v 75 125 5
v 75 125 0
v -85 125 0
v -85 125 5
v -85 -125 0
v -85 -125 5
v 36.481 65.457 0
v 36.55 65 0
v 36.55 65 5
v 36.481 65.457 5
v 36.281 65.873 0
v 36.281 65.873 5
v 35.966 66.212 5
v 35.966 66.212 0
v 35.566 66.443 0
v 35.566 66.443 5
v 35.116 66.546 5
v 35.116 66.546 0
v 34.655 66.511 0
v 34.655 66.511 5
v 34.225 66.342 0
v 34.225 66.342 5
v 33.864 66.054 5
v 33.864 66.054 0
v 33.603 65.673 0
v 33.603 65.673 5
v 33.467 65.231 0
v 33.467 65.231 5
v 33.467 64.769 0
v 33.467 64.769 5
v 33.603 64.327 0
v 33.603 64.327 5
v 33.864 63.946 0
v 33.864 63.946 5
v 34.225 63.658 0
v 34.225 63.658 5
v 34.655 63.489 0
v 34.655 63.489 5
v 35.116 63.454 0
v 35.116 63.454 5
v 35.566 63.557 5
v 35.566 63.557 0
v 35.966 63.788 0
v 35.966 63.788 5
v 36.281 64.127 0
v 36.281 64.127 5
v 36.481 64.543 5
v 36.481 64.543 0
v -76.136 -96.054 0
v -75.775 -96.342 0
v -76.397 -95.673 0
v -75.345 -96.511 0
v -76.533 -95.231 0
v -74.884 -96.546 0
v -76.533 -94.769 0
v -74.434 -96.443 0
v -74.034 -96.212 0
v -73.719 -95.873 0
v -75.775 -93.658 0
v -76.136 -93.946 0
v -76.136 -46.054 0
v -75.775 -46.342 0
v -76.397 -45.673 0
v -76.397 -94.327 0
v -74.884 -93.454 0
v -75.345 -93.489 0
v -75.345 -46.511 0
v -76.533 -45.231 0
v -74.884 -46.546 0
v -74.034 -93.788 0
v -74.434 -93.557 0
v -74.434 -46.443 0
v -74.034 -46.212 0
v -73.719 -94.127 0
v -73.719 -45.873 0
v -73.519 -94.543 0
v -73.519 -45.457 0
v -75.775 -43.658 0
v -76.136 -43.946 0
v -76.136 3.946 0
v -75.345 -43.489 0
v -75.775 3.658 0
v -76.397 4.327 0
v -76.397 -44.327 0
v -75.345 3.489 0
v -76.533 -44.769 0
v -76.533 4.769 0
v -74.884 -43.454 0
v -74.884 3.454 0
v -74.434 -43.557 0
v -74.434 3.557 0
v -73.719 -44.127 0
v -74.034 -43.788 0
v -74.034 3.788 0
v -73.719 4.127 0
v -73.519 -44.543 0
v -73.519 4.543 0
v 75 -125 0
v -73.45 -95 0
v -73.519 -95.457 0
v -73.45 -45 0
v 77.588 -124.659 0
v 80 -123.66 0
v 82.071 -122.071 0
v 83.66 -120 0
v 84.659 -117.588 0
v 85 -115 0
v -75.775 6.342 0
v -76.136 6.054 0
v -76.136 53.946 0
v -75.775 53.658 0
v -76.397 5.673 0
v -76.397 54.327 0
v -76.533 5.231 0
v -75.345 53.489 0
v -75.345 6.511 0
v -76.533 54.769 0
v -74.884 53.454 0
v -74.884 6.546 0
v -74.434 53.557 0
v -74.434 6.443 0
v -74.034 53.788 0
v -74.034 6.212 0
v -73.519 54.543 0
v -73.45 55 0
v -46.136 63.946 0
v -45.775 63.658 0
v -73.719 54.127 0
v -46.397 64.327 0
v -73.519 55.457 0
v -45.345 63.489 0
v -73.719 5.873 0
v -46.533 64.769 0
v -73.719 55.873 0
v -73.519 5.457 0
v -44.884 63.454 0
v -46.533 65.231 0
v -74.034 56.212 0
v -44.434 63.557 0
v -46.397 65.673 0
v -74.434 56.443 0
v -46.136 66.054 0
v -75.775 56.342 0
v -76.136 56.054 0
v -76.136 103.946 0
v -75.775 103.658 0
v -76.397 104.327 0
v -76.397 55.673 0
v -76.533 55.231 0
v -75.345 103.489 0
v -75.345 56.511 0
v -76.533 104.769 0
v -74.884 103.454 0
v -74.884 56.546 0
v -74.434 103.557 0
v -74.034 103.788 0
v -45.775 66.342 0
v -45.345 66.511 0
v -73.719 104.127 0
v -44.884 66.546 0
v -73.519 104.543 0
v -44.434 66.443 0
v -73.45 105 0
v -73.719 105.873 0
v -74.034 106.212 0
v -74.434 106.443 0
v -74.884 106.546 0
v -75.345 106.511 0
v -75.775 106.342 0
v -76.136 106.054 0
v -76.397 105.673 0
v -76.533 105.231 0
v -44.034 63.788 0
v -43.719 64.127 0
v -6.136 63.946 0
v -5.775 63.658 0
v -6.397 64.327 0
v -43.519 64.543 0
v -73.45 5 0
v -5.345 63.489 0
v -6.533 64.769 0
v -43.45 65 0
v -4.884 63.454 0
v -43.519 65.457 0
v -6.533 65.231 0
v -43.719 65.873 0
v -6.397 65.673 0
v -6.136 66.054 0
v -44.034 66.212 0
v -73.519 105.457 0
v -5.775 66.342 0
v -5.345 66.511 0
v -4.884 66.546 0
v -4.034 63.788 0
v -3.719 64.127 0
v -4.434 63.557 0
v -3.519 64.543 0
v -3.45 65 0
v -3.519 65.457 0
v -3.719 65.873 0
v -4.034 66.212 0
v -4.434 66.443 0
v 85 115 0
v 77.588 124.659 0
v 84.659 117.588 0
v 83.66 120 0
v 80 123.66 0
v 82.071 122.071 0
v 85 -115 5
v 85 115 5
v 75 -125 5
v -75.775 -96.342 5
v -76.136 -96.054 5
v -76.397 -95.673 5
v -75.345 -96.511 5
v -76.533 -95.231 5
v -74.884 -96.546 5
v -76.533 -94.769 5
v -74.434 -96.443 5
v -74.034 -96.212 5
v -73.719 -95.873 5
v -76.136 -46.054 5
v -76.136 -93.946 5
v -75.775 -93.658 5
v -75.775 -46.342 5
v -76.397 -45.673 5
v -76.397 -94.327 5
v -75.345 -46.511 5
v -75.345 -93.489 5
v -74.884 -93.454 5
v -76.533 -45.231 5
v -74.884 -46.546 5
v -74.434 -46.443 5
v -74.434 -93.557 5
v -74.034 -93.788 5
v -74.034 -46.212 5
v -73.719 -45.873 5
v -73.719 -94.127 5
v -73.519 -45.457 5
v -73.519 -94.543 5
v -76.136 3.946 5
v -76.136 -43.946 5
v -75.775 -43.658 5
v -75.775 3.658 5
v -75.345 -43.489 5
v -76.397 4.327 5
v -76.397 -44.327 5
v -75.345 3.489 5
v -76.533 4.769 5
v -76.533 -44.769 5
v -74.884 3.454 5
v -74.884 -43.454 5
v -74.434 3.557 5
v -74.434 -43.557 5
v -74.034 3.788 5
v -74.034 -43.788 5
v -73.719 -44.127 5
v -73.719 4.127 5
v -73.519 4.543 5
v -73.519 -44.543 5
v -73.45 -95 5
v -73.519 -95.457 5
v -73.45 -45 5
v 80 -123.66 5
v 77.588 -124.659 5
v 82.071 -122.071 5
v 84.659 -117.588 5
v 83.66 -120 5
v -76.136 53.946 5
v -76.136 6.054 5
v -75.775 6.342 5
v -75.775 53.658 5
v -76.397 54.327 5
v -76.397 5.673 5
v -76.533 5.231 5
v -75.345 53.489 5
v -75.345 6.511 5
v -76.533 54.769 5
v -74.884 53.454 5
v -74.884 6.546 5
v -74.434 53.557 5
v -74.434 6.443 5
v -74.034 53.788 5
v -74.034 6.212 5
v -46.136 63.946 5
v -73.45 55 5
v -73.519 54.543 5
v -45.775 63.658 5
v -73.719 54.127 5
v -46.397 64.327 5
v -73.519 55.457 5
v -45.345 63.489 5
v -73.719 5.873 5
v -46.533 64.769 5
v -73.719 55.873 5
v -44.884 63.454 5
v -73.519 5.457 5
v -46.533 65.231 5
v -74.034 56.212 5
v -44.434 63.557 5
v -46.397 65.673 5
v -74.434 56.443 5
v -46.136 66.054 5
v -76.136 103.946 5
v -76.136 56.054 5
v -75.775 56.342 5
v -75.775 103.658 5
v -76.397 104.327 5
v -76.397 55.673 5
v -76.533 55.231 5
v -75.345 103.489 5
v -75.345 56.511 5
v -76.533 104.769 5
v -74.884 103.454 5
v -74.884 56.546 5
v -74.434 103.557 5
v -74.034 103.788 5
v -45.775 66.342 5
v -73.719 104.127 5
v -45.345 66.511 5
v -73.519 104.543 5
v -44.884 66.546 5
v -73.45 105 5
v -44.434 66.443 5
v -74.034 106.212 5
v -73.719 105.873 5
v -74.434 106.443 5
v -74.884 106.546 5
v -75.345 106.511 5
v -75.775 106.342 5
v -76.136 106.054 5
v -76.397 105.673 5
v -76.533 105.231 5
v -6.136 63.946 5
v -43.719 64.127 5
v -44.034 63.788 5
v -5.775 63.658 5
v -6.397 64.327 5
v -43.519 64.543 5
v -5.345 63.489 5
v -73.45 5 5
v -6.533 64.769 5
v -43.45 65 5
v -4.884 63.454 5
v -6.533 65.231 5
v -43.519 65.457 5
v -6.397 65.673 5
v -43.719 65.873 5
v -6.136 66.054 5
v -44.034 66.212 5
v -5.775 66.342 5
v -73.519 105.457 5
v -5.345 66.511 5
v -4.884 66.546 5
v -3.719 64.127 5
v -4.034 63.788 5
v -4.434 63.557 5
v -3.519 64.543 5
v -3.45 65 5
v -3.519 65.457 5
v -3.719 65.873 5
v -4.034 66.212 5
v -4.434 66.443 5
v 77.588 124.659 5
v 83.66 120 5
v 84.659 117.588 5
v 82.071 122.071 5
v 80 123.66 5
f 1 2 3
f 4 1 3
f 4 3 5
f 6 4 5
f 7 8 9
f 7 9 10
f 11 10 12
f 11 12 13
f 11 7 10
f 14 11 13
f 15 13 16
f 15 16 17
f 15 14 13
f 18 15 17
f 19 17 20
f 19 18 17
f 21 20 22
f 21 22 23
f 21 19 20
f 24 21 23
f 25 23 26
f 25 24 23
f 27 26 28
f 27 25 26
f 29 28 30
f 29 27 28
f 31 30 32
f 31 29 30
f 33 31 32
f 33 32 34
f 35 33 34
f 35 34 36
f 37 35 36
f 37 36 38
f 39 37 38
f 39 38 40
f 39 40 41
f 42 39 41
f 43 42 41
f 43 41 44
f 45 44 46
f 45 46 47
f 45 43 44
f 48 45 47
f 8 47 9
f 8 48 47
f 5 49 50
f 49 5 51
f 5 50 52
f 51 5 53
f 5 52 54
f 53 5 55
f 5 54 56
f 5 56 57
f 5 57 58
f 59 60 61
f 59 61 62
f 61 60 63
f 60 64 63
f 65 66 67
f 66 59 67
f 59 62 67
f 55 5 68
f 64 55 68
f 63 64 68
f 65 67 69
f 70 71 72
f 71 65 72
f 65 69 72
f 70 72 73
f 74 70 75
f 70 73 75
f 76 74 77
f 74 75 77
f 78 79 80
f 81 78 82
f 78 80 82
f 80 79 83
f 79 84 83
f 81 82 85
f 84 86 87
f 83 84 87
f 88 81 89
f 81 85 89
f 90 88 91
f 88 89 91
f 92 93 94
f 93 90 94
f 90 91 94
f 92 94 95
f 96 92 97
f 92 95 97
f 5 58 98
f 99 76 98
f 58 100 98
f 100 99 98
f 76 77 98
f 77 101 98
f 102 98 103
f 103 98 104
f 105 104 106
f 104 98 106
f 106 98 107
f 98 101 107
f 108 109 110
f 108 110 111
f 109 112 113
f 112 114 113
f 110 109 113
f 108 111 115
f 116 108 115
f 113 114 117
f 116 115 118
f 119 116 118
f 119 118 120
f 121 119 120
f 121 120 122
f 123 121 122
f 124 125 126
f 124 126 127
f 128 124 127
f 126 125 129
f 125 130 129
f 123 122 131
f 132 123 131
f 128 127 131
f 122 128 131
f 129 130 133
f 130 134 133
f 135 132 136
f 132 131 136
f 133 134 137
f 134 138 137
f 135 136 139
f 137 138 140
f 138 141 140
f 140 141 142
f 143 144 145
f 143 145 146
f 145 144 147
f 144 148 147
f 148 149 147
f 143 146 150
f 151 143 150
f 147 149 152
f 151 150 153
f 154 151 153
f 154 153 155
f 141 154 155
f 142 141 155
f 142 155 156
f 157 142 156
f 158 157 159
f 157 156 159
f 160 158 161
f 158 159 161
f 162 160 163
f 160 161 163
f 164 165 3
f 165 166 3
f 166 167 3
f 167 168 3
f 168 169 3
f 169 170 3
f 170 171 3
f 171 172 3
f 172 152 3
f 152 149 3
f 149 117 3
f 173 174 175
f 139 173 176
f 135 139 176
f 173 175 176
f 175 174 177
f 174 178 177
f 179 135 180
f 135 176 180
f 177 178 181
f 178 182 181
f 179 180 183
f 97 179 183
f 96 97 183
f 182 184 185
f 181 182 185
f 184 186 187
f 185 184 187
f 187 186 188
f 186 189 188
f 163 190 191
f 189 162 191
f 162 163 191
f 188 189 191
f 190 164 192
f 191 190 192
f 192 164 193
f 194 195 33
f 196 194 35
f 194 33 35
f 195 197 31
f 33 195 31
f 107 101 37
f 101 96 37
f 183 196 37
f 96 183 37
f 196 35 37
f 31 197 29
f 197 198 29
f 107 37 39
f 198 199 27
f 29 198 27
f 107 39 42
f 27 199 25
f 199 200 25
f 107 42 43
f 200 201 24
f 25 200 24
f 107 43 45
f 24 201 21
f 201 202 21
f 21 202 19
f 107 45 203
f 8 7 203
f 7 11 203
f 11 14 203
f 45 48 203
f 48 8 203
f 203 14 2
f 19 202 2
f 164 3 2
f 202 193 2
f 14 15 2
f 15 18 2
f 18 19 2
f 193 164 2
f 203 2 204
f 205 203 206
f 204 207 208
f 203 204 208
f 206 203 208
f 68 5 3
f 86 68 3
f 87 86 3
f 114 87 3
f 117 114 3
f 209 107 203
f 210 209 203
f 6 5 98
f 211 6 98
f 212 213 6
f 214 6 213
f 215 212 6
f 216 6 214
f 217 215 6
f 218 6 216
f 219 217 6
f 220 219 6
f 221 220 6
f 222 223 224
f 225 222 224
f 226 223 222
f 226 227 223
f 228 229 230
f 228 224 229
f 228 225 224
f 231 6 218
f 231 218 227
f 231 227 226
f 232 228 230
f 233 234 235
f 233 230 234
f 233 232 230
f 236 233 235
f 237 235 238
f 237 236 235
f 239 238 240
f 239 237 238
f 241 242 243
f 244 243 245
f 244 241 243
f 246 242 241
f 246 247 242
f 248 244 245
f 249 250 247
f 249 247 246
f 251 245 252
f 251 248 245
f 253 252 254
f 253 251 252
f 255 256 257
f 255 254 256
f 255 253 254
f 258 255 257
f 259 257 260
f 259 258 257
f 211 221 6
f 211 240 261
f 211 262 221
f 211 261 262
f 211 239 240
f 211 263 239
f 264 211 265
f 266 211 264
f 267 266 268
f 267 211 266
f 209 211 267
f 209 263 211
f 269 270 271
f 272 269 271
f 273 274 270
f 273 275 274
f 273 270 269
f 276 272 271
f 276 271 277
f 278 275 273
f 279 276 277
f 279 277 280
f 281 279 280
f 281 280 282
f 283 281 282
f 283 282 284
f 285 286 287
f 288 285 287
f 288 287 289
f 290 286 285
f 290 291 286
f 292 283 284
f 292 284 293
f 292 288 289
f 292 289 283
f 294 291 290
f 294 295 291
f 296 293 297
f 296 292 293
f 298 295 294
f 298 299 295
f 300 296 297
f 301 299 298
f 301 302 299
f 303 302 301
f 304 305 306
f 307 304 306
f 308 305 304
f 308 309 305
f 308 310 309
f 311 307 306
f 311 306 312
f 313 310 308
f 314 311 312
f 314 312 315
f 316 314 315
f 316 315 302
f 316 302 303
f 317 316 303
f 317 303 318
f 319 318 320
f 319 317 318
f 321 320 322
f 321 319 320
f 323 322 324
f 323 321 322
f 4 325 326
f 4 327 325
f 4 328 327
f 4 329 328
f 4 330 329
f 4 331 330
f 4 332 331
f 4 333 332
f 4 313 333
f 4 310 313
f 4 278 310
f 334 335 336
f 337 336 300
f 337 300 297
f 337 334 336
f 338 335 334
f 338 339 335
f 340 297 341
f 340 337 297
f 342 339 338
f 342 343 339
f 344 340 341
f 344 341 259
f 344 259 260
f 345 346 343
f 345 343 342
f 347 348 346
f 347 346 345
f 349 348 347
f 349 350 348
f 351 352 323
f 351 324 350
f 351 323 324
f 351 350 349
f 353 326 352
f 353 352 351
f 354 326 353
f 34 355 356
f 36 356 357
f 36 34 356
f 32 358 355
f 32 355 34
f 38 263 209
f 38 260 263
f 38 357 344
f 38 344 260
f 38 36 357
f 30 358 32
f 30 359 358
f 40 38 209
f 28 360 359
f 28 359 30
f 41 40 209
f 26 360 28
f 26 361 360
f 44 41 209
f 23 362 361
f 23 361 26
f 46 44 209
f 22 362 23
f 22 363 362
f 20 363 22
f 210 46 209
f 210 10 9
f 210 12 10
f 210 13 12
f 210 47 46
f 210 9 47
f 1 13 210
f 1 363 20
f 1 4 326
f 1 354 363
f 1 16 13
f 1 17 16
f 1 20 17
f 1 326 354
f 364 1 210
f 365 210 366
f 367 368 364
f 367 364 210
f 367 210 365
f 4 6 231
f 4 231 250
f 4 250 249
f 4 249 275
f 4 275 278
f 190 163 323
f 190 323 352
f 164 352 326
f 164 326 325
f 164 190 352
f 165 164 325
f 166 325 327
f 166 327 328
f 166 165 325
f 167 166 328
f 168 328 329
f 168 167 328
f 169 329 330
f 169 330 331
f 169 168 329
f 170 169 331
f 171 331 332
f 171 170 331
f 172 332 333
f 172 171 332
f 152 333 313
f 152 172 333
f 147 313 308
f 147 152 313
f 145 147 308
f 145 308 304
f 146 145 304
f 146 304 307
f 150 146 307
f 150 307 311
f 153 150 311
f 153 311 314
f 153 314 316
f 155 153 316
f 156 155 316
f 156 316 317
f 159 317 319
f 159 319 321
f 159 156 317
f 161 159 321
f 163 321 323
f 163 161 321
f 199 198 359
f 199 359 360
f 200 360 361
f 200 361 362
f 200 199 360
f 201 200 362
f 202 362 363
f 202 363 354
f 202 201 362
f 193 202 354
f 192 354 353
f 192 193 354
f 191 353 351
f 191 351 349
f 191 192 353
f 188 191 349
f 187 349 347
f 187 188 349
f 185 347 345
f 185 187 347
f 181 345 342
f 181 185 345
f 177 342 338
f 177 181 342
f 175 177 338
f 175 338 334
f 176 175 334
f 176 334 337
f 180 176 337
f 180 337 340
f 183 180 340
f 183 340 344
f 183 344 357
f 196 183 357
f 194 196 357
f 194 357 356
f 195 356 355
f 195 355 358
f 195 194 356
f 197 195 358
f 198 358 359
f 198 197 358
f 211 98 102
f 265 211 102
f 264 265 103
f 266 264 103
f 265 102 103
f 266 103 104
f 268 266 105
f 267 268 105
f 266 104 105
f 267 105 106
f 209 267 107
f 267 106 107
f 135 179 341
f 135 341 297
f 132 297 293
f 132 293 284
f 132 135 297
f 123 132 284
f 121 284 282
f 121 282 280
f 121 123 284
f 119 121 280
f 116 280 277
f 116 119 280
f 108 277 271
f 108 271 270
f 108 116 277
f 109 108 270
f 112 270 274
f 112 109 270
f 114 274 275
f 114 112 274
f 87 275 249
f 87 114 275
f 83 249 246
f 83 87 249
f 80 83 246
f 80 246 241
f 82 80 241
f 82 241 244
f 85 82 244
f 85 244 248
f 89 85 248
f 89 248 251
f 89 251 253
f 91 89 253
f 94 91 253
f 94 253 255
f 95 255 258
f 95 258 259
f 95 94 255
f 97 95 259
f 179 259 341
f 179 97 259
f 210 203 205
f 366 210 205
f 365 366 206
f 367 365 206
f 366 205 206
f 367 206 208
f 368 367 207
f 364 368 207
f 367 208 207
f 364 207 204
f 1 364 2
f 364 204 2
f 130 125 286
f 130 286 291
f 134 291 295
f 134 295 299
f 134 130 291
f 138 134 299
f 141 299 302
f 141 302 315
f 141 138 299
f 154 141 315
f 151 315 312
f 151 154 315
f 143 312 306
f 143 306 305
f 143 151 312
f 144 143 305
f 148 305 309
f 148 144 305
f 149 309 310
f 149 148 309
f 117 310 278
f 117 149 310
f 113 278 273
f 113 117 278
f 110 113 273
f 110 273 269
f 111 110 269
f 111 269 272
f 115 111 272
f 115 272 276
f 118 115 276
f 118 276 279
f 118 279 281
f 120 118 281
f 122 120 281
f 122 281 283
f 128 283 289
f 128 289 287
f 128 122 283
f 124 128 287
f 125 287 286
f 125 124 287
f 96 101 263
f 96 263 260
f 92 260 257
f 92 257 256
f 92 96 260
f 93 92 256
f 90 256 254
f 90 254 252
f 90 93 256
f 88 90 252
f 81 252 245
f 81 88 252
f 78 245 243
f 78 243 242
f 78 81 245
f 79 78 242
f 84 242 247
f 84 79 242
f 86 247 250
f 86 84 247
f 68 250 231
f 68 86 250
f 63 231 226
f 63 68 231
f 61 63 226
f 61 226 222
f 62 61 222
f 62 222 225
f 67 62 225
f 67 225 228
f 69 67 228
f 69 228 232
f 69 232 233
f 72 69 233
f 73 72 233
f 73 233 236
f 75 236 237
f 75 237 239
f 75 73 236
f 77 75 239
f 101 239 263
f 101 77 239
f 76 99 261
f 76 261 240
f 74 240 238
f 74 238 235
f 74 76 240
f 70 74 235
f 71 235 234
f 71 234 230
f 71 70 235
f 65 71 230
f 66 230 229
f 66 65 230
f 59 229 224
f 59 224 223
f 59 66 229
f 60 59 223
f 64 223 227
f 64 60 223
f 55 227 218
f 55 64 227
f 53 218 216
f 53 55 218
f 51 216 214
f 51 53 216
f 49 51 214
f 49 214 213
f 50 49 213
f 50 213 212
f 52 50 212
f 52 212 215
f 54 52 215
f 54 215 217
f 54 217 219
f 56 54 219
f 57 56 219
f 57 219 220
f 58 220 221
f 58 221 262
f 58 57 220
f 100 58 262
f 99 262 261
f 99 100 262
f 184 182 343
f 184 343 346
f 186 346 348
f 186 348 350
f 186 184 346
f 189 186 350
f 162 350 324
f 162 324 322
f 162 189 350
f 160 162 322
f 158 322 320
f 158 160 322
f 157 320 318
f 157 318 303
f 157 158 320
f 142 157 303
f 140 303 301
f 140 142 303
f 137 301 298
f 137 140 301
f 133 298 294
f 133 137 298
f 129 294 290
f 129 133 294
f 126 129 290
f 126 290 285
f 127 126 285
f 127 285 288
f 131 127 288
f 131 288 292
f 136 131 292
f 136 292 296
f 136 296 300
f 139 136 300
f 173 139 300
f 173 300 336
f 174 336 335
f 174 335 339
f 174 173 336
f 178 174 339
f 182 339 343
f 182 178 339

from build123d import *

# Parameters (mm, degrees)
CROQUIS1_R              = 1.55
SALIENTE_EXTRUIR1_DEPTH = 5


with BuildPart() as part:
    # Croquis1 → Saliente-Extruir1 (new body)
    with BuildSketch(Plane.XY):
        with BuildLine():
            Line((75, 125), (-85, 125))
            Line((-85, 125), (-85, -125))
            Line((-85, -125), (75, -125))
            ThreePointArc((75, -125), (82.071067812, -122.071067812), (85, -115))
            Line((85, -115), (85, 115))
            ThreePointArc((85, 115), (82.071067812, 122.071067812), (75, 125))
        make_face()
        with Locations((35, 65)):
            Circle(CROQUIS1_R, mode=Mode.SUBTRACT)
        with Locations((-75, 105)):
            Circle(CROQUIS1_R, mode=Mode.SUBTRACT)
        with Locations((-75, 55)):
            Circle(CROQUIS1_R, mode=Mode.SUBTRACT)
        with Locations((-75, 5)):
            Circle(CROQUIS1_R, mode=Mode.SUBTRACT)
        with Locations((-75, -45)):
            Circle(CROQUIS1_R, mode=Mode.SUBTRACT)
        with Locations((-75, -95)):
            Circle(CROQUIS1_R, mode=Mode.SUBTRACT)
        with Locations((-5, 65)):
            Circle(CROQUIS1_R, mode=Mode.SUBTRACT)
        with Locations((-45, 65)):
            Circle(CROQUIS1_R, mode=Mode.SUBTRACT)
    extrude(amount=SALIENTE_EXTRUIR1_DEPTH)


solid = part.part
